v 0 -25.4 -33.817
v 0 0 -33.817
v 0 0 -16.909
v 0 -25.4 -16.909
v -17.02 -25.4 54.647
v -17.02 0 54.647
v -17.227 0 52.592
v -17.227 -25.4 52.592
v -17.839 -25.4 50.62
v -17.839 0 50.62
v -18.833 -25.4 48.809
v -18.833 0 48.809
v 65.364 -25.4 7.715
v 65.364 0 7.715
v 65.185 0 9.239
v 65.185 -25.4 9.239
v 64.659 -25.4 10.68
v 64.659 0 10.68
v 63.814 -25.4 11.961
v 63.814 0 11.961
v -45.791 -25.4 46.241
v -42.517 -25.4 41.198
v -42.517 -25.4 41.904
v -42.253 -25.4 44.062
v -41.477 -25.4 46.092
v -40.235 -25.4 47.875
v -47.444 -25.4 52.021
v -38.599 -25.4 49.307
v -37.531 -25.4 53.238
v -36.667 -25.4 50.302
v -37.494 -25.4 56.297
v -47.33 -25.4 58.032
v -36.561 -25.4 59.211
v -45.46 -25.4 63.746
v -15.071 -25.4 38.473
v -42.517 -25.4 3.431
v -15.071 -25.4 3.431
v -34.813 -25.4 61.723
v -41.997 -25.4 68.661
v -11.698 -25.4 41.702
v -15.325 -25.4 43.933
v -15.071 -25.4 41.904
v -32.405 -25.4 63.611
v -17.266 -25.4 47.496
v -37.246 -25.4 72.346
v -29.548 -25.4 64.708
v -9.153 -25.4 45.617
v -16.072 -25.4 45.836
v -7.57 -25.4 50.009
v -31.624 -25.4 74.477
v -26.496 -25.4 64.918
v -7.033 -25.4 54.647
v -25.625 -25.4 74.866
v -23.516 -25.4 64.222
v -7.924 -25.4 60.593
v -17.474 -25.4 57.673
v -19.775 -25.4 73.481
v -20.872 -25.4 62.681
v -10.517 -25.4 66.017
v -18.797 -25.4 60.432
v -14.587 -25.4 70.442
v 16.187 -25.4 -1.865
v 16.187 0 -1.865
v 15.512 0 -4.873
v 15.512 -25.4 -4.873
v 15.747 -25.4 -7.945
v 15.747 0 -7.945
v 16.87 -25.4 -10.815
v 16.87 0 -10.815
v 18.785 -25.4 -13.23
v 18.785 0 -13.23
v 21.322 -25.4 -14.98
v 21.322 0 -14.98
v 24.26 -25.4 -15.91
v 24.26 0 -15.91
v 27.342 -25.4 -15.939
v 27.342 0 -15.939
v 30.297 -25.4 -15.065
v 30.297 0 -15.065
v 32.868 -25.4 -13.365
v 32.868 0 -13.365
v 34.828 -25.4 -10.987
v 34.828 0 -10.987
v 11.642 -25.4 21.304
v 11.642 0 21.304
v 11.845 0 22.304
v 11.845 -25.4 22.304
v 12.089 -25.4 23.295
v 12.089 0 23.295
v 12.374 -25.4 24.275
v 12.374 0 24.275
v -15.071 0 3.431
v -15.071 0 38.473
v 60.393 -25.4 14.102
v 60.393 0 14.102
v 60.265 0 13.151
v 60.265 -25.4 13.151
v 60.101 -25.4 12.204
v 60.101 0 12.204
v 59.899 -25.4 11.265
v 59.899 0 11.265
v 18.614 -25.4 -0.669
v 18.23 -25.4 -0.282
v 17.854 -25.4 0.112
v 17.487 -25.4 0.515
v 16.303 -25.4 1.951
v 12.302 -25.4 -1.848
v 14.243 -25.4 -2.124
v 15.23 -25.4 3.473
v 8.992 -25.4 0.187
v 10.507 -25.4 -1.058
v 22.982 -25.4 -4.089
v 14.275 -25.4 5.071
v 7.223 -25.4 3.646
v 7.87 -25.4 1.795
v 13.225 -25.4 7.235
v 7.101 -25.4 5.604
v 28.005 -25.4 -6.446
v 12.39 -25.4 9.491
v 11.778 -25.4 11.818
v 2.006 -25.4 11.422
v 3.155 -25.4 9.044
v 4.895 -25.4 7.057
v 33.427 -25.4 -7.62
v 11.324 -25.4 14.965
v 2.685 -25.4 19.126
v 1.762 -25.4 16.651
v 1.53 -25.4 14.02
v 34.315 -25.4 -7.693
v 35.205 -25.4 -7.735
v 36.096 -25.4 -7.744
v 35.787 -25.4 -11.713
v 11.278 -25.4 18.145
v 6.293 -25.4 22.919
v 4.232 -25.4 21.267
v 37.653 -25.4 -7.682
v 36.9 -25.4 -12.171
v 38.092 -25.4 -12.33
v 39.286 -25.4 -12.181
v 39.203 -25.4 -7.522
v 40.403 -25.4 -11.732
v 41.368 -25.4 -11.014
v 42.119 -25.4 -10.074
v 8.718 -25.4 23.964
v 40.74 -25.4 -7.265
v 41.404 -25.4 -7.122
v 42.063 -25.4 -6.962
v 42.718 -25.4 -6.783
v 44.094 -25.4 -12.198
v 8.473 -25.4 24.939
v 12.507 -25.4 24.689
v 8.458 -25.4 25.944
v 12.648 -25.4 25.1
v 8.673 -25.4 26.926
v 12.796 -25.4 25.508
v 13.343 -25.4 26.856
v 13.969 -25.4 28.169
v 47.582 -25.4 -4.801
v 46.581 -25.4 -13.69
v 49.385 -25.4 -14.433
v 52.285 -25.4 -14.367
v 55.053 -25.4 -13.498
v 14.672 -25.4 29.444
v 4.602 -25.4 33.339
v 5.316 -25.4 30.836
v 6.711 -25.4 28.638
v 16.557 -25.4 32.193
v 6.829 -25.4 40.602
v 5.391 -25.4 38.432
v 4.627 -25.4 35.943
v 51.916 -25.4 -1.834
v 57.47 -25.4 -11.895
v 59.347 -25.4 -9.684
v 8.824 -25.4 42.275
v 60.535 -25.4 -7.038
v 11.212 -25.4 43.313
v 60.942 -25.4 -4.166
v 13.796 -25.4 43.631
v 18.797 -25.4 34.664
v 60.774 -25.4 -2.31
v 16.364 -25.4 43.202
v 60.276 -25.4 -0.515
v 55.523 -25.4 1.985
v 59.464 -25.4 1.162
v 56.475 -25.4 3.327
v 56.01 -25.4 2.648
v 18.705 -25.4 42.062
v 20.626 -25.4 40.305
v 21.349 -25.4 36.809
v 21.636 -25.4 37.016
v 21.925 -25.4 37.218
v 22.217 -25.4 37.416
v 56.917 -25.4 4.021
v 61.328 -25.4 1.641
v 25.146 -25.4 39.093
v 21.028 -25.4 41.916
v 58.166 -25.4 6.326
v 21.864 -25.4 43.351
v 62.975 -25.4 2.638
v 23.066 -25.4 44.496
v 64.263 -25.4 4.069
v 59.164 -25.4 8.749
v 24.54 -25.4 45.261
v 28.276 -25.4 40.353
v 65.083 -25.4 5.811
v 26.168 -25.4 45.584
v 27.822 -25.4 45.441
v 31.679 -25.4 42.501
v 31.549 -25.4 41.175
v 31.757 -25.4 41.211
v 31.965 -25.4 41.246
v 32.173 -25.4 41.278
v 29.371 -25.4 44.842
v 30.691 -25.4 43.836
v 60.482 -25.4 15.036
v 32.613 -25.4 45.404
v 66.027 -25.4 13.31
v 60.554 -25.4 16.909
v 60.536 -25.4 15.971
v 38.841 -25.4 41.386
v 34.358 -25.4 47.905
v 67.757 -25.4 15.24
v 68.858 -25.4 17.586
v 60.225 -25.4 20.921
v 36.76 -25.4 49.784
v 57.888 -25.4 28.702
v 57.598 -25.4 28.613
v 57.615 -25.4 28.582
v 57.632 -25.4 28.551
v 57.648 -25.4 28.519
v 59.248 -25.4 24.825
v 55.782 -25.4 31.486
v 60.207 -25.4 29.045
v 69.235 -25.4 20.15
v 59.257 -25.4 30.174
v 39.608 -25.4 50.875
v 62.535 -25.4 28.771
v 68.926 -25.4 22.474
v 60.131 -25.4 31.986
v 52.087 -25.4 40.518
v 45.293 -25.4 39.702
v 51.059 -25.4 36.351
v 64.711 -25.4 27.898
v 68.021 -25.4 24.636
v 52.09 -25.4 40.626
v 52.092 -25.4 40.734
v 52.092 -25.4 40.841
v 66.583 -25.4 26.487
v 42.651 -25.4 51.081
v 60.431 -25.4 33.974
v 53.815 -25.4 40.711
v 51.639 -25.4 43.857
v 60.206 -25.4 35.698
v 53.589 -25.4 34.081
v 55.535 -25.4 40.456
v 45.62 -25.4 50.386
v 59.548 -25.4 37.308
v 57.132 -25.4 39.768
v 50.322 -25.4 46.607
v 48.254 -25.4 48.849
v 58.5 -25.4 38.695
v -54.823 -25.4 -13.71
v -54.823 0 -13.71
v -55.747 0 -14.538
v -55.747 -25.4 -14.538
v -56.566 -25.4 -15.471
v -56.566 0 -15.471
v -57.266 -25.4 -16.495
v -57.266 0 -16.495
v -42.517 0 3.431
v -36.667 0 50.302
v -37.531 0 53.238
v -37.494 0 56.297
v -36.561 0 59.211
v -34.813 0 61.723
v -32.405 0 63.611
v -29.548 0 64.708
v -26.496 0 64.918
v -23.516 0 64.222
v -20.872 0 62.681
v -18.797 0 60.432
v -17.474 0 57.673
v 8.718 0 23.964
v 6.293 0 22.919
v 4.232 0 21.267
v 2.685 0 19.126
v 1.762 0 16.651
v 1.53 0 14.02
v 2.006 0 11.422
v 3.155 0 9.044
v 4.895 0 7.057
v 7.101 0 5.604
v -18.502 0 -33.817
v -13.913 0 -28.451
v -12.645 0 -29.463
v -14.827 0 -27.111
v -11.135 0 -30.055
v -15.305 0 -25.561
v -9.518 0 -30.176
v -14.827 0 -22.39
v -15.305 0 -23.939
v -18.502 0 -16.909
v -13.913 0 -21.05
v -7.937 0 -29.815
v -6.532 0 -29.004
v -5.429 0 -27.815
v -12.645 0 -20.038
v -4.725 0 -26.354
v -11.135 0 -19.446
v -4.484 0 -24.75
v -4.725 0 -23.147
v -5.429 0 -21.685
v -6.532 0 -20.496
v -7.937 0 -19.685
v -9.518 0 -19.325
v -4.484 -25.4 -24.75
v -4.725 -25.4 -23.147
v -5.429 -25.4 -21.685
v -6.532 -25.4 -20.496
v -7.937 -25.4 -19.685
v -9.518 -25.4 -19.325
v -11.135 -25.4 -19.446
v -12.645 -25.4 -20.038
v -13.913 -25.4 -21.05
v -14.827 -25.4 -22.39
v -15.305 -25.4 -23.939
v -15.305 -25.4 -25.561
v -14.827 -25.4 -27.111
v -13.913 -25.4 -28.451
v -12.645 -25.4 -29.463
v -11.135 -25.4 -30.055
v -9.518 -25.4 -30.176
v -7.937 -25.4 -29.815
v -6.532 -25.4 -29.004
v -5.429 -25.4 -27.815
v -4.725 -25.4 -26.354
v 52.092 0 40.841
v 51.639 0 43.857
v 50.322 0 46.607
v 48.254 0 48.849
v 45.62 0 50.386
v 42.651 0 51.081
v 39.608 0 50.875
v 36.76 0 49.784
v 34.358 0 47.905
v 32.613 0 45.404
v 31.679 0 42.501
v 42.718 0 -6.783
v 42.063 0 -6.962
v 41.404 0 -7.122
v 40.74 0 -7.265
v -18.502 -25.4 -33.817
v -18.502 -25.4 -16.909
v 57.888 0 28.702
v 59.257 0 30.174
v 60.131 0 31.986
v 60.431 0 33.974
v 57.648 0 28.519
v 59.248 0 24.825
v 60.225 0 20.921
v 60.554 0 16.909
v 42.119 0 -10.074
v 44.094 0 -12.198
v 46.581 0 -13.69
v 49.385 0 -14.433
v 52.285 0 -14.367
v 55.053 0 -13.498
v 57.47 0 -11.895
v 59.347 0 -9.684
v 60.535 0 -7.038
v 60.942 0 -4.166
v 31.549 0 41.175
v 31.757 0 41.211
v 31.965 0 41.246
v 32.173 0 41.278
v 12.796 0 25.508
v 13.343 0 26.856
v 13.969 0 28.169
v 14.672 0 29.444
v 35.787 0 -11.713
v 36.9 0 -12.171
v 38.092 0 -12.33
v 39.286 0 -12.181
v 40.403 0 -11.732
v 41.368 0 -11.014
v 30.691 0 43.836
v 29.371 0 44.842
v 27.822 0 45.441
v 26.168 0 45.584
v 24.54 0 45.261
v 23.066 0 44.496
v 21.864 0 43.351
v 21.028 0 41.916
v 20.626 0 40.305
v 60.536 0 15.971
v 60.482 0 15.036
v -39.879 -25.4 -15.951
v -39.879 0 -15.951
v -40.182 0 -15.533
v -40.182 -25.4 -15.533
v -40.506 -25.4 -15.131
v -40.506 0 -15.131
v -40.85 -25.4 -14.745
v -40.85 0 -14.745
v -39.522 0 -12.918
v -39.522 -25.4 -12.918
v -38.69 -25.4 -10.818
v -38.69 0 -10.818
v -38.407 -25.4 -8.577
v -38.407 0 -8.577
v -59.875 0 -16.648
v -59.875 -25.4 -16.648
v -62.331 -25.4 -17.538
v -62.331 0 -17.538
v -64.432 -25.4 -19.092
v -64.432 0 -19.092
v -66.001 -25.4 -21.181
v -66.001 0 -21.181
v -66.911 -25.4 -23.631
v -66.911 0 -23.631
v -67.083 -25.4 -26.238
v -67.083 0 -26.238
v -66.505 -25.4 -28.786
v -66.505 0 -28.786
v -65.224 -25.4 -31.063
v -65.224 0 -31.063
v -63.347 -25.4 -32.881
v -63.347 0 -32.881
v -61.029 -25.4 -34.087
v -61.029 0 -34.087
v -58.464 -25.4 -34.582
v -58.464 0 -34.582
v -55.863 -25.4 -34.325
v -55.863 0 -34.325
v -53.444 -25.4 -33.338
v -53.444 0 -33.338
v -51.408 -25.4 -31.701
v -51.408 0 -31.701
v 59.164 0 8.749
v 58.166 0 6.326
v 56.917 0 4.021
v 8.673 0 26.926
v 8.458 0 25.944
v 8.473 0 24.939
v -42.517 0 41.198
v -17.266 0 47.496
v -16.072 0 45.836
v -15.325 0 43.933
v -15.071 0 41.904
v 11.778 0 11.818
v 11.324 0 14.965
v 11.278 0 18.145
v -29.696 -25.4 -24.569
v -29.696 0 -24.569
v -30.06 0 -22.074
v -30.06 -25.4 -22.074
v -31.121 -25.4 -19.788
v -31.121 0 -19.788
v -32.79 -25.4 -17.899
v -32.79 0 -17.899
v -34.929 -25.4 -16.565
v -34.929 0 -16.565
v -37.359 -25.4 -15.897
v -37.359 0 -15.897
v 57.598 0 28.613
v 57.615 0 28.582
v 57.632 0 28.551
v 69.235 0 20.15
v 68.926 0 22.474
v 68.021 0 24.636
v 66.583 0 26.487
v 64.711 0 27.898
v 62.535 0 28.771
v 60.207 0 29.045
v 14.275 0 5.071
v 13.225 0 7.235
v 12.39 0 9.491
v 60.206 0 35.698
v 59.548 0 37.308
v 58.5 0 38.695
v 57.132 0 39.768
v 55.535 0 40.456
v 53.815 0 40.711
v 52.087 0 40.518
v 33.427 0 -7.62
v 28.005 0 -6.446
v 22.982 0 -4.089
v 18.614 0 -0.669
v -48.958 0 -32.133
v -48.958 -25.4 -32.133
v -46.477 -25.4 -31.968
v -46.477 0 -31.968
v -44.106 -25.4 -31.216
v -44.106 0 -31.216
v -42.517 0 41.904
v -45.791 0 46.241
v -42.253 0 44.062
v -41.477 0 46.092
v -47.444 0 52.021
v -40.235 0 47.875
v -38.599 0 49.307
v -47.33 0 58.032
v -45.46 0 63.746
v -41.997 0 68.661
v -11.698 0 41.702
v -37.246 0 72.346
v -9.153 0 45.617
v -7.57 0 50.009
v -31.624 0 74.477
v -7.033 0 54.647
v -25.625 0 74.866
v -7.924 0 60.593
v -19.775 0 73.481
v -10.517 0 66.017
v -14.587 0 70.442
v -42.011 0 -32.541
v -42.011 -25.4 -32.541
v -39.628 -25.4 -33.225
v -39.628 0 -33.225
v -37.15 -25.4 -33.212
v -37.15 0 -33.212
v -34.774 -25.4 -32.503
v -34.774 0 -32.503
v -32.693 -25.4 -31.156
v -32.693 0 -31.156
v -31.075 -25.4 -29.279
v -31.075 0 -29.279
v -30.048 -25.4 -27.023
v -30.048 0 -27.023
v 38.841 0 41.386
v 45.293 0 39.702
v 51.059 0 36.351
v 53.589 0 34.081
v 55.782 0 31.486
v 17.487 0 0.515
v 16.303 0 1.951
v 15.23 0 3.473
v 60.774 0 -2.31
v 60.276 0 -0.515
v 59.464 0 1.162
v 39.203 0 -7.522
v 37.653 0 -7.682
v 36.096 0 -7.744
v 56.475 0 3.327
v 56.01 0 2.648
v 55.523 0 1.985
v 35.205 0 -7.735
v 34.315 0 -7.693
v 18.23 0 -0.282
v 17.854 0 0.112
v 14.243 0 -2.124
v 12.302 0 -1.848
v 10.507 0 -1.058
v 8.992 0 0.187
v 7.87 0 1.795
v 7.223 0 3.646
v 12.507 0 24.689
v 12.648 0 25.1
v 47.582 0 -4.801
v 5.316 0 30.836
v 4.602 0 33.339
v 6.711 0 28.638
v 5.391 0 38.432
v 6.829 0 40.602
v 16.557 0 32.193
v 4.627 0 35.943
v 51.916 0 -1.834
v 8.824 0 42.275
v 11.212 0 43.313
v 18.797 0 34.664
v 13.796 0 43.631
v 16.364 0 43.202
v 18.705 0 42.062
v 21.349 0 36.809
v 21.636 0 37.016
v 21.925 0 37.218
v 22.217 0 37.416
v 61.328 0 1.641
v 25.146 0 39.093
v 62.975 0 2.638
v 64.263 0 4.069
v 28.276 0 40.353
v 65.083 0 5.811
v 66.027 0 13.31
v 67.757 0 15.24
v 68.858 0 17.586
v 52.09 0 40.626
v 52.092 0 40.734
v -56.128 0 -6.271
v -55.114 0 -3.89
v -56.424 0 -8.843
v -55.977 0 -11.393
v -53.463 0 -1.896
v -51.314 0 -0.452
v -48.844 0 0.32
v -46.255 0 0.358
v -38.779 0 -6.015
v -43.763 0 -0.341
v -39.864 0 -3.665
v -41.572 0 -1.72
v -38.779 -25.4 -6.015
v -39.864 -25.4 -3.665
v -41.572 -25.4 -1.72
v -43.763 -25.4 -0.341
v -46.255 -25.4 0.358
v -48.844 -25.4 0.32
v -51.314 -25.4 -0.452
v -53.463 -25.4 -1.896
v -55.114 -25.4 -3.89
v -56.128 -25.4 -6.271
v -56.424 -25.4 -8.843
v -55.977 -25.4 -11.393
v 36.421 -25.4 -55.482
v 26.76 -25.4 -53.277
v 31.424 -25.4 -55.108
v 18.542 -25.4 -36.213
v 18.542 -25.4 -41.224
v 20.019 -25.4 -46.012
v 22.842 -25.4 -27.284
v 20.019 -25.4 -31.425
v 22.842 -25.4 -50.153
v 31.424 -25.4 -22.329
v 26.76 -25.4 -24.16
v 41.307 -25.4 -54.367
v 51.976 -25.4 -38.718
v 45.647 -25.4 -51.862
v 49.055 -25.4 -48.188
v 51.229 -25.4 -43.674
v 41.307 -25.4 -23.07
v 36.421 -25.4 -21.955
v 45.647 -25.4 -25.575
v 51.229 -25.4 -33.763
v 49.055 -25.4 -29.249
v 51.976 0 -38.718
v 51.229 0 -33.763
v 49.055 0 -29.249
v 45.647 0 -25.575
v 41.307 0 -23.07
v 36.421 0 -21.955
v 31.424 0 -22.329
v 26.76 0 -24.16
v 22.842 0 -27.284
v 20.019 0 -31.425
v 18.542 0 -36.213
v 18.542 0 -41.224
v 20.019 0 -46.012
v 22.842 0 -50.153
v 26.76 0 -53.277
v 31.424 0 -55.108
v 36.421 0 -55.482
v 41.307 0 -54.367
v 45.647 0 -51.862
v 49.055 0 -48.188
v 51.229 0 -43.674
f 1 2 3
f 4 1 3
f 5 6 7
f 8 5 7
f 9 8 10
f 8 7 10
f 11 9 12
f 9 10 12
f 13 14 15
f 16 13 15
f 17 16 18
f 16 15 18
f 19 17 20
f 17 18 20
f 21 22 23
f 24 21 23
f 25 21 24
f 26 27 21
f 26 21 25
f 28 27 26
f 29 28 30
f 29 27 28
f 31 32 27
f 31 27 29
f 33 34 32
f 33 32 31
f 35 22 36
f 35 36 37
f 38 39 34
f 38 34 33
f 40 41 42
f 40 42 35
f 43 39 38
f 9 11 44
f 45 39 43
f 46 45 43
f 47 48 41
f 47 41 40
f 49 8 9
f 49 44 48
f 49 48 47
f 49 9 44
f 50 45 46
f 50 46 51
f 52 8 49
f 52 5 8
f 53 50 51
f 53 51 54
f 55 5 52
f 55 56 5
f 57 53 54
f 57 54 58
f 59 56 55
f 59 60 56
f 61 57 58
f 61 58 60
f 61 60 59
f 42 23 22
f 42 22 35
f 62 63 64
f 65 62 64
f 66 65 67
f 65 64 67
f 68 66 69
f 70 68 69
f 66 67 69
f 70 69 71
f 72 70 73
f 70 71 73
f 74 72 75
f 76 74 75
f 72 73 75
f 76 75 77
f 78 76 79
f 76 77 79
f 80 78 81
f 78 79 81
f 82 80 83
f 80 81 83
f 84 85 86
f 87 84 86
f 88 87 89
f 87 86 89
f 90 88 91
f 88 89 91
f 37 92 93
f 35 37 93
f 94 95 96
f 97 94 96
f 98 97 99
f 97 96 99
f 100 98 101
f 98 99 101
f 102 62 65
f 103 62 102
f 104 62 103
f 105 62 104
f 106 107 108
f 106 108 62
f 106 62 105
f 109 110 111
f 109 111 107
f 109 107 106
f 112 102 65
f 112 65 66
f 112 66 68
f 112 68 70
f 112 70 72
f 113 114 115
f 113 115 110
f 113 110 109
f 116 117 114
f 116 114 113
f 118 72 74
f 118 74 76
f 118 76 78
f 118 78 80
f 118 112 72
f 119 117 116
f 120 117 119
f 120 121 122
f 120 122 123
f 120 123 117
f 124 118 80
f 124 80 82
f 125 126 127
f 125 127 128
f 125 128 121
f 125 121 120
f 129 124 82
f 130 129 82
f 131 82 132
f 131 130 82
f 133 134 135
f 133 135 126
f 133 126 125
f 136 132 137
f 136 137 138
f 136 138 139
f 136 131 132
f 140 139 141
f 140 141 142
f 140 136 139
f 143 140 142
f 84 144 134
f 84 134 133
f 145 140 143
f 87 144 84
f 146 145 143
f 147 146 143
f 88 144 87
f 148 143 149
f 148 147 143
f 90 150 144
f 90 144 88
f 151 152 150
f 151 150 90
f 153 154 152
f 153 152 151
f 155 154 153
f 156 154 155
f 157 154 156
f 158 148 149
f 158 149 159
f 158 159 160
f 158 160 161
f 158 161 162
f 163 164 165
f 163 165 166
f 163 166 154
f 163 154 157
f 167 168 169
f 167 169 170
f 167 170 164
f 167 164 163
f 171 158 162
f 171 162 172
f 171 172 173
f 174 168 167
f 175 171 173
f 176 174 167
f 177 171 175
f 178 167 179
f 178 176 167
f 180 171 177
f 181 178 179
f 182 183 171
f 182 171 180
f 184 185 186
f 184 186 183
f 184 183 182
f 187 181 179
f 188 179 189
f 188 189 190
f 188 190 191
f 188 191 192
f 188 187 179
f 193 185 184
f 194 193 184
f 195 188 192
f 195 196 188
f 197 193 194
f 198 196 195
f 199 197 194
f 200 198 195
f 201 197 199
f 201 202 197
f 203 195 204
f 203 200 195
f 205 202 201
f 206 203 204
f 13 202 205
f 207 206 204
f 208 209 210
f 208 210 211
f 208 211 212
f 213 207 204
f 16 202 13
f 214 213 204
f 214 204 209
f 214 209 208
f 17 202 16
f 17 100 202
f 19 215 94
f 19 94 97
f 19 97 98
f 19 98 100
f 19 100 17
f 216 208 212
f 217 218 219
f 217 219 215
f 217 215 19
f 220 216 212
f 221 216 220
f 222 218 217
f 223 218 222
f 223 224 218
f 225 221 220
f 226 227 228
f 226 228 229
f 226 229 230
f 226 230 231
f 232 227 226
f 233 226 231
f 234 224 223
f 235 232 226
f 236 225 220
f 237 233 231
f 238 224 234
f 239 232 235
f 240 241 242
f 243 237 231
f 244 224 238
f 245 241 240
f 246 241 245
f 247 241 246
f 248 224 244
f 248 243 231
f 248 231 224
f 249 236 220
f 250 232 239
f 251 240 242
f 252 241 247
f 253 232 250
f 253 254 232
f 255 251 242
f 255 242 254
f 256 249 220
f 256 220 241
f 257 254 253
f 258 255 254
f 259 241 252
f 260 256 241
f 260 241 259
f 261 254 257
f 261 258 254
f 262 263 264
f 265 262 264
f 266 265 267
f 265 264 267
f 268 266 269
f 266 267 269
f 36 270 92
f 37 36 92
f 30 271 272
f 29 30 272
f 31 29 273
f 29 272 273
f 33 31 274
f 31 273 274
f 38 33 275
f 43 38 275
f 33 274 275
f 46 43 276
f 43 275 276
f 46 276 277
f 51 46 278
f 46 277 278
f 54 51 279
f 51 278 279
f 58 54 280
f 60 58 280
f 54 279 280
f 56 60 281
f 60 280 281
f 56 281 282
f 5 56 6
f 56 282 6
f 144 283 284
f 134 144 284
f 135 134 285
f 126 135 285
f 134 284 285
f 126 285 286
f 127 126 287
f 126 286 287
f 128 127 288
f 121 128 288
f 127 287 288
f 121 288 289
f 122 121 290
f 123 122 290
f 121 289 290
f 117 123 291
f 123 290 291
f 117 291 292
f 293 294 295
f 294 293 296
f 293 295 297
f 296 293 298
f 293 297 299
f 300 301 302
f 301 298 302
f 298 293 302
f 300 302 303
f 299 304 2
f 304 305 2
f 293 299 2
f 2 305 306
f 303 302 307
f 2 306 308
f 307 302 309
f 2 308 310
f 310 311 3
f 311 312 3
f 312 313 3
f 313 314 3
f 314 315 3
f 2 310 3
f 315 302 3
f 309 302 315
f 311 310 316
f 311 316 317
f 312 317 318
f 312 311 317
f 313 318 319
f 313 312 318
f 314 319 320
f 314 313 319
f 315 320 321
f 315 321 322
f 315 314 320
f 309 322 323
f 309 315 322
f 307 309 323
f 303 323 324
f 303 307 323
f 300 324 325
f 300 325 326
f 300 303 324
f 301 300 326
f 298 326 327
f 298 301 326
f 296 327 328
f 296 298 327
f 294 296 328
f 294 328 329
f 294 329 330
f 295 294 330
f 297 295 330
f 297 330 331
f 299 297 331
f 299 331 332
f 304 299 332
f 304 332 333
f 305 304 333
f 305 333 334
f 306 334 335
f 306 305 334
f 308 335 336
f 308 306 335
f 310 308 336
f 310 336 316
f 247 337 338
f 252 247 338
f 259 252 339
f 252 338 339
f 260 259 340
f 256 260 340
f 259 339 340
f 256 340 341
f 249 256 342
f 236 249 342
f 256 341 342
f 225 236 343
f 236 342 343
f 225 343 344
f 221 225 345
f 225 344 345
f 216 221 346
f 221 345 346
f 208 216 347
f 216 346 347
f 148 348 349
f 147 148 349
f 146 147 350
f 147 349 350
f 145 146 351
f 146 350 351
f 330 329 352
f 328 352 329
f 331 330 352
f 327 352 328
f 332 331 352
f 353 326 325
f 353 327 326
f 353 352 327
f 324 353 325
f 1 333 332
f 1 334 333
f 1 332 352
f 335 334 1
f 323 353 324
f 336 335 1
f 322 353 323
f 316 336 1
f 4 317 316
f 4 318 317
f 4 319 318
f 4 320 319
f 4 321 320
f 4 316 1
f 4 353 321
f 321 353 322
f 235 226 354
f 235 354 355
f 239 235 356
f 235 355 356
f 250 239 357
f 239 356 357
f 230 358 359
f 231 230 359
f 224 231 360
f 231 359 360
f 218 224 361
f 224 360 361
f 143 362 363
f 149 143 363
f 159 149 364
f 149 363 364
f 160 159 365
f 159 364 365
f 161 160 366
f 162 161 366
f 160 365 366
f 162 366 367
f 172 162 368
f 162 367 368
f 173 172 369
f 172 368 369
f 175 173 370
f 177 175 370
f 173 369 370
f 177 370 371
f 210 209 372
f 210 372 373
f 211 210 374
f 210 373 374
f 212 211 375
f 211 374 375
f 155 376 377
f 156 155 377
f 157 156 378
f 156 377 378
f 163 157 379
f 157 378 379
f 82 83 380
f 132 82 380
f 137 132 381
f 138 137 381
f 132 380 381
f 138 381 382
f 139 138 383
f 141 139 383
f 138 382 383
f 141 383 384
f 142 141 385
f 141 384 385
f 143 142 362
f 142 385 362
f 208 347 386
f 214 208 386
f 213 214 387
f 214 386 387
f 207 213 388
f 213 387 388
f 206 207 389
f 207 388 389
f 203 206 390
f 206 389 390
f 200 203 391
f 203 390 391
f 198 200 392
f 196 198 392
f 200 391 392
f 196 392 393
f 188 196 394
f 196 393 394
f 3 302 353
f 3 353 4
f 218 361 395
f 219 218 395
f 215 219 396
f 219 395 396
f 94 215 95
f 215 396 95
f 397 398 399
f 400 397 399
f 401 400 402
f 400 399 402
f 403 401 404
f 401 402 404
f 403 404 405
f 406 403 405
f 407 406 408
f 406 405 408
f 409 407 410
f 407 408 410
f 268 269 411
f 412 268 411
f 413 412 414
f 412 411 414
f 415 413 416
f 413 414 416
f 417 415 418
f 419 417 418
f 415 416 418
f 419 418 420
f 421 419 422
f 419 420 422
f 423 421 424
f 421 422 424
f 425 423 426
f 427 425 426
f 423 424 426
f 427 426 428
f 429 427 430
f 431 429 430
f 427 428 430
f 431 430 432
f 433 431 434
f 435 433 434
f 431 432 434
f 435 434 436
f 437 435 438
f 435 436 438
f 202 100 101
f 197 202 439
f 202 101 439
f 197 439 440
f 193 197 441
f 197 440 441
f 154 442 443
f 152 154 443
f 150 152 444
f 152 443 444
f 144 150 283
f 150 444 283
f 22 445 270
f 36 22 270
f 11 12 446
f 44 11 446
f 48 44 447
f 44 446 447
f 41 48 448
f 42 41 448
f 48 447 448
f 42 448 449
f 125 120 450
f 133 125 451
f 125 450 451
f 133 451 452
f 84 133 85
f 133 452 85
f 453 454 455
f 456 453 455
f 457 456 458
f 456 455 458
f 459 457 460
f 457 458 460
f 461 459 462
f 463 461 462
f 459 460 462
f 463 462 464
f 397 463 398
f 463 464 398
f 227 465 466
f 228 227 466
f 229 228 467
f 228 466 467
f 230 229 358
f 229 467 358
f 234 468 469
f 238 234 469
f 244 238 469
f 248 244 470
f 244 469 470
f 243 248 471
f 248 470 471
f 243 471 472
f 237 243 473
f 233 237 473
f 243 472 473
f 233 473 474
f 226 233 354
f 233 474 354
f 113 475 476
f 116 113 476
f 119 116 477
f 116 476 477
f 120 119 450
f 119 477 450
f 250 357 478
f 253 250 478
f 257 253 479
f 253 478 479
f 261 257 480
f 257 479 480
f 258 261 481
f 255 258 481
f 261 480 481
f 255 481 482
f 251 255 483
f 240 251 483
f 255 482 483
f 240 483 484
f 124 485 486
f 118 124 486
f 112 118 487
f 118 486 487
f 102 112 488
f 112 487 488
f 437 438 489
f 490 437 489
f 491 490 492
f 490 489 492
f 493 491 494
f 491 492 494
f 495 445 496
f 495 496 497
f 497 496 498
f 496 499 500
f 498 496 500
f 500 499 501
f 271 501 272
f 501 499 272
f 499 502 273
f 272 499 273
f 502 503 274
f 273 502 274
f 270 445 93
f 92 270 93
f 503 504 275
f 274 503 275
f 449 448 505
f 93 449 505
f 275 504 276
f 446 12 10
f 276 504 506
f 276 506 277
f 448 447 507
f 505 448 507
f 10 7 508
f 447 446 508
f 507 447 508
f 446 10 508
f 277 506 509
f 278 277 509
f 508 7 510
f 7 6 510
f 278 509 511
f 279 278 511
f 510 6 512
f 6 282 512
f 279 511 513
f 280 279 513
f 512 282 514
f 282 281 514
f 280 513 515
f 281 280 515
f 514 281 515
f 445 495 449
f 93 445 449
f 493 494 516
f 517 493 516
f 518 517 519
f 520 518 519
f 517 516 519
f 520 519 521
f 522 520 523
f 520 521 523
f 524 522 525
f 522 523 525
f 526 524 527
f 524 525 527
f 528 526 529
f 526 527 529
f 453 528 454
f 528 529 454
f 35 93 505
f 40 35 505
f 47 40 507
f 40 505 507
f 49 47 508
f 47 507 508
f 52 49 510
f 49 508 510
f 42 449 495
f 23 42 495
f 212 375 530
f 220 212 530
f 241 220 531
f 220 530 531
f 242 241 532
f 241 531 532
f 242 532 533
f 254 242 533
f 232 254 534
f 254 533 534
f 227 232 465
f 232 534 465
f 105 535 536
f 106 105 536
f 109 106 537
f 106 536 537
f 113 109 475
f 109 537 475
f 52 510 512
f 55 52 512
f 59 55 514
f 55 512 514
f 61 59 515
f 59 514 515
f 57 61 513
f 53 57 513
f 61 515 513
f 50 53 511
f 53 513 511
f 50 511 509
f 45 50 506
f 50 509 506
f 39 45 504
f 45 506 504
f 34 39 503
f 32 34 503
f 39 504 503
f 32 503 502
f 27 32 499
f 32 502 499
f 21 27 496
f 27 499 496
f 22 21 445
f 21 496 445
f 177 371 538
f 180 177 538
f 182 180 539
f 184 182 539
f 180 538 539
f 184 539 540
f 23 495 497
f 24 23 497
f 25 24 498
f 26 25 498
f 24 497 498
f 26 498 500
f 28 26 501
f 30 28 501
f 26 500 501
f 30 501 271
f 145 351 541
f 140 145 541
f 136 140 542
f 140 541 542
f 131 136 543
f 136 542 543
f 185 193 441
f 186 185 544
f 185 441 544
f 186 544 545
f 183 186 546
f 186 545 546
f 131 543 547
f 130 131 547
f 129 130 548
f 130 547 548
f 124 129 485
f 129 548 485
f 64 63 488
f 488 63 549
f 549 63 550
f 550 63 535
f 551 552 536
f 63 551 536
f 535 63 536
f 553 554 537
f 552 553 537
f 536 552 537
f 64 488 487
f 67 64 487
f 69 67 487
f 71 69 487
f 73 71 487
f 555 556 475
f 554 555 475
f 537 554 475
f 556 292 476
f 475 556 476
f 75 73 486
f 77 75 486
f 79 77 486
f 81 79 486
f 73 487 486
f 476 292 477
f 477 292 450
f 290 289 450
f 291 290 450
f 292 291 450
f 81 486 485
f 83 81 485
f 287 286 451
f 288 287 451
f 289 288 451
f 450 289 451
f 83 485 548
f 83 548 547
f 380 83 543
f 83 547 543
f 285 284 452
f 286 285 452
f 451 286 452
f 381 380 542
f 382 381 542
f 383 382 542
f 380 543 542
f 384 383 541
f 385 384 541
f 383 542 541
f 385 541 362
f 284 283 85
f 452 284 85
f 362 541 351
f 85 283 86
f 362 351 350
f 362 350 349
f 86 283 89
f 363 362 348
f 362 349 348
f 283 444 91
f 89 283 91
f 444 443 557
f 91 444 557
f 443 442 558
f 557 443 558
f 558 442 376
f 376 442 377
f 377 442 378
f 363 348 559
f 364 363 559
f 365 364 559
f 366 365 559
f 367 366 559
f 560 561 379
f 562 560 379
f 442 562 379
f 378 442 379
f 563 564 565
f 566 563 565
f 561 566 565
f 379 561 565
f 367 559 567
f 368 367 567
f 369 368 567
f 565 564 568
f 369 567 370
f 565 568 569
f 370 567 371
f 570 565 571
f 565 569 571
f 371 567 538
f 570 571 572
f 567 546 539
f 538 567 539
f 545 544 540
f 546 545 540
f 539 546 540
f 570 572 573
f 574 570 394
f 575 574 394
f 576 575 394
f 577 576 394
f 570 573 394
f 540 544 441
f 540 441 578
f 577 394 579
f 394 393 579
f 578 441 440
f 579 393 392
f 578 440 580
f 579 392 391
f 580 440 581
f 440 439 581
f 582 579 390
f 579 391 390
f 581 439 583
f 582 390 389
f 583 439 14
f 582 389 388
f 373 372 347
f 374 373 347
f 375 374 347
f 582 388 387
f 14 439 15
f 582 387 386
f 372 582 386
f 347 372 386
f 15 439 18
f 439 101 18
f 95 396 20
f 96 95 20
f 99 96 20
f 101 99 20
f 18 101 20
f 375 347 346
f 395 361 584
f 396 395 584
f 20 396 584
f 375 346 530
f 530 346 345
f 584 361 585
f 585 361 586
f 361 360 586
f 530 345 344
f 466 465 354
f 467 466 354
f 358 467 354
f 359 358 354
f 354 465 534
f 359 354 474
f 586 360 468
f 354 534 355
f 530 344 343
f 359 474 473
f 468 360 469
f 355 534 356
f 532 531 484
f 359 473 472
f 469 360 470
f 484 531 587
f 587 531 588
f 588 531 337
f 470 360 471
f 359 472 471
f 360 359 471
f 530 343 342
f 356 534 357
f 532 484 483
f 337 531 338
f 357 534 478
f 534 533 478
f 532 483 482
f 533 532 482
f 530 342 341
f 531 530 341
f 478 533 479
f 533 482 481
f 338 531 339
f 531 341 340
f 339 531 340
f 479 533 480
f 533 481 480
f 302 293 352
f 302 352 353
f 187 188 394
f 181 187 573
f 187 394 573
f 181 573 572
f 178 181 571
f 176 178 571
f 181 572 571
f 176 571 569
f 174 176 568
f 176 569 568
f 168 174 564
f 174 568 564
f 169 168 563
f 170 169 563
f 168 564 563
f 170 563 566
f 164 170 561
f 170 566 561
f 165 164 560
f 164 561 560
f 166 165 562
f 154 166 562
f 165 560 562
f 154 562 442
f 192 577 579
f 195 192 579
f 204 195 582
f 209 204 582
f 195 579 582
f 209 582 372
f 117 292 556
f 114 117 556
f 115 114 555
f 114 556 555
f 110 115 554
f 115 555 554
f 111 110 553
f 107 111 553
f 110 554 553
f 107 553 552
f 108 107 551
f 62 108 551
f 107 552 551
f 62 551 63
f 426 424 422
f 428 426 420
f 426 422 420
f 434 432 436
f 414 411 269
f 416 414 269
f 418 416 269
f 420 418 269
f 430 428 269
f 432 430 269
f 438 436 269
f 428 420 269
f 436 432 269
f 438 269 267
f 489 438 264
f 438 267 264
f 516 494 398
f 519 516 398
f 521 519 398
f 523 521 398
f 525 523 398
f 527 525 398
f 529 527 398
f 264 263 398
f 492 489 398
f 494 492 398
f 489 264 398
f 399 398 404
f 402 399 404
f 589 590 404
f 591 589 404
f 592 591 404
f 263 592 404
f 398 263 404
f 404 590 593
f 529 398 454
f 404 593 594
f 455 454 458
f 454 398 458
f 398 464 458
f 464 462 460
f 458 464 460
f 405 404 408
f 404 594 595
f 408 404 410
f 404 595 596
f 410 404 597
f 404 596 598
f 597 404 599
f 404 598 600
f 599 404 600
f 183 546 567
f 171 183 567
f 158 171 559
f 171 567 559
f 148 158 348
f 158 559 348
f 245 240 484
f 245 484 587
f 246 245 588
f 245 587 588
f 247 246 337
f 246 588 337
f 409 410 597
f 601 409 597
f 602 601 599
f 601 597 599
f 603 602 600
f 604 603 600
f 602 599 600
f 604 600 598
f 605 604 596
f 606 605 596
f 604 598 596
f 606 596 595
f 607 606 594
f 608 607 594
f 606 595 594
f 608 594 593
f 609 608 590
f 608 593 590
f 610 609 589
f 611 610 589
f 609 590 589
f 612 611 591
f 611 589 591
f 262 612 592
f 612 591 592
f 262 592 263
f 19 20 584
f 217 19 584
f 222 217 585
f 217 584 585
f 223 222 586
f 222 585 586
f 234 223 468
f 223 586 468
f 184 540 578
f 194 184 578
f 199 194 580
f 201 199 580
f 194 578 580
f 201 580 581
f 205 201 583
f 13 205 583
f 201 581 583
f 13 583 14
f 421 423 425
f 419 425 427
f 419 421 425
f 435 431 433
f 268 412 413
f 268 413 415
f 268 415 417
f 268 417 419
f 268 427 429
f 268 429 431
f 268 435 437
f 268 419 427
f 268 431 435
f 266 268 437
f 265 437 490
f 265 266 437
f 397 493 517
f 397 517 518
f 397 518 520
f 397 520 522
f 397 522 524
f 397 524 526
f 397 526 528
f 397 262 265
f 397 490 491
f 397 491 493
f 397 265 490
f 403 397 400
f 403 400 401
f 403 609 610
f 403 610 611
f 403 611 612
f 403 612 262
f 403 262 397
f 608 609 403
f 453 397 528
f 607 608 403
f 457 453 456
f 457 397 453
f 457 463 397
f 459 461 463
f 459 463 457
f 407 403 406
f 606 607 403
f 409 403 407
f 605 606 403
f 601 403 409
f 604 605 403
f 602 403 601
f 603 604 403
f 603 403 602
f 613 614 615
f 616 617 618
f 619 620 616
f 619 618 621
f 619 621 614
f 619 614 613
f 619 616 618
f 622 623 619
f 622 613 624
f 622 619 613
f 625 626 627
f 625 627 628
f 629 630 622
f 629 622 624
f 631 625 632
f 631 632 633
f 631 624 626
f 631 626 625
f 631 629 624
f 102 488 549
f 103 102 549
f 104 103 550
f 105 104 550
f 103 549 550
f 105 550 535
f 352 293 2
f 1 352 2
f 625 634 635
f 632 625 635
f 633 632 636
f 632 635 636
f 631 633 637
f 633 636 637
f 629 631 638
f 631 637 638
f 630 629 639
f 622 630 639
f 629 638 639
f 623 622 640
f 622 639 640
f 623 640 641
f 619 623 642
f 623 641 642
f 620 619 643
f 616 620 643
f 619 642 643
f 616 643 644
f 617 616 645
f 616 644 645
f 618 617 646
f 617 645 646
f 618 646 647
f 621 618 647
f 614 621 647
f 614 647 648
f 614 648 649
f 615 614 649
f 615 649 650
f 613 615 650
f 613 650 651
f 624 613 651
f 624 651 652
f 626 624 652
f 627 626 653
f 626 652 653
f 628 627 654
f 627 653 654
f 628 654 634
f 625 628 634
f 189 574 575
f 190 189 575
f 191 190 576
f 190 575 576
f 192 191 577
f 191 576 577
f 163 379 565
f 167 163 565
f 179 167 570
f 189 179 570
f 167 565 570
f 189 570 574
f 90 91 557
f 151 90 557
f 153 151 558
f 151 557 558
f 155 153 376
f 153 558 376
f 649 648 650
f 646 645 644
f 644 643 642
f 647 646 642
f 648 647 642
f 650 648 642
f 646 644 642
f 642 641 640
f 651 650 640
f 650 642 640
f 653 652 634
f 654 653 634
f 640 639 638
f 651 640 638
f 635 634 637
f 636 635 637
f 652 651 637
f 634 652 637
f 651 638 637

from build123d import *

# Parameters (mm, degrees)
F1_DEPTH = 25.4
F0_W     = 18.5015480965
F0_H     = 16.9086977839
F0_R     = 5.4410723948
F0_R_2   = 16.8107477908


with BuildPart() as f1:
    # F0 (on Front) → F1 (new body)
    with BuildSketch(Plane.XZ):
        with BuildLine():
            ThreePointArc((-44.105960391, -31.2155596656), (-39.701340636, -27.4006422459), (-38.0592641048, -21.8097697943))
            ThreePointArc((-38.0592641048, -21.8097697943), (-38.5247490039, -18.7424495054), (-39.8792886329, -15.9513292394))
            ThreePointArc((-39.8792886329, -15.9513292394), (-46.8550976629, -22.2370236132), (-44.105960391, -31.2155596656))
        make_face()
        with BuildLine():
            ThreePointArc((-39.8792886329, -15.9513292394), (-38.5247490039, -18.7424495054), (-38.0592641048, -21.8097697943))
            ThreePointArc((-38.0592641048, -21.8097697943), (-39.701340636, -27.4006422459), (-44.105960391, -31.2155596656))
            ThreePointArc((-44.105960391, -31.2155596656), (-34.7742718917, -32.5031076851), (-29.6964222745, -24.5687751098))
            ThreePointArc((-29.6964222745, -24.5687751098), (-32.7896501946, -17.8988586822), (-39.8792886329, -15.9513292394))
        make_face()
        with BuildLine():
            ThreePointArc((-44.105960391, -31.2155596656), (-46.8550976629, -22.2370236132), (-39.8792886329, -15.9513292394))
            ThreePointArc((-39.8792886329, -15.9513292394), (-40.3417982851, -15.3299965274), (-40.8495270544, -14.7450341232))
            ThreePointArc((-40.8495270544, -14.7450341232), (-48.083492635, -17.5627692138), (-54.8233426971, -13.709937761))
            ThreePointArc((-54.8233426971, -13.709937761), (-56.1705113302, -14.9921012619), (-57.2661782927, -16.4948721947))
            ThreePointArc((-57.2661782927, -16.4948721947), (-51.3655623816, -19.3982706429), (-48.9802804829, -25.5266816069))
            ThreePointArc((-48.9802804829, -25.5266816069), (-49.6089599176, -28.8437891732), (-51.4078010658, -31.7008175177))
            ThreePointArc((-51.4078010658, -31.7008175177), (-47.7125109929, -32.1258351585), (-44.105960391, -31.2155596656))
        make_face()
        with BuildLine():
            ThreePointArc((-54.8233426971, -13.709937761), (-48.083492635, -17.5627692138), (-40.8495270544, -14.7450341232))
            ThreePointArc((-40.8495270544, -14.7450341232), (-47.6343396192, -11.4991970983), (-54.8233426971, -13.709937761))
        make_face()
        with BuildLine():
            ThreePointArc((-54.8233426971, -13.709937761), (-47.6343396192, -11.4991970983), (-40.8495270544, -14.7450341232))
            ThreePointArc((-40.8495270544, -14.7450341232), (-39.0401194284, -11.8938912699), (-38.4073600457, -8.5768764839))
            ThreePointArc((-38.4073600457, -8.5768764839), (-50.1069455323, 0.0230189296), (-54.8233426971, -13.709937761))
        make_face()
        with BuildLine():
            ThreePointArc((-57.2661782927, -16.4948721947), (-66.5049464666, -28.7857797019), (-51.4078010658, -31.7008175177))
            ThreePointArc((-51.4078010658, -31.7008175177), (-58.0456640551, -25.5266816069), (-57.2661782927, -16.4948721947))
        make_face()
        with BuildLine():
            ThreePointArc((-57.2661782927, -16.4948721947), (-58.0456640551, -25.5266816069), (-51.4078010658, -31.7008175177))
            ThreePointArc((-51.4078010658, -31.7008175177), (-49.6089599176, -28.8437891732), (-48.9802804829, -25.5266816069))
            ThreePointArc((-48.9802804829, -25.5266816069), (-51.3655623816, -19.3982706429), (-57.2661782927, -16.4948721947))
        make_face()
    extrude(amount=F1_DEPTH)


with BuildPart() as f1b:
    # F0 (on Front) → F1, piece 2 (new body)
    with BuildSketch(Plane.XZ):
        with BuildLine():
            Line((-15.0707969442, 41.9041663408), (-42.5168015063, 41.9041663408))
            Line((-42.5168015063, 41.9041663408), (-42.5168015063, 41.1980028544))
            ThreePointArc((-42.5168015063, 41.1980028544), (-29.3278937528, 34.4555273158), (-15.0707969442, 38.4734191396))
            Line((-15.0707969442, 38.4734191396), (-15.0707969442, 41.9041663408))
        make_face()
        with BuildLine():
            Line((-42.5168015063, 41.1980028544), (-42.5168015063, 41.9041663408))
            ThreePointArc((-42.5168015063, 41.9041663408), (-40.910051081, 47.0215506819), (-36.6665349653, 50.3020750911))
            ThreePointArc((-36.6665349653, 50.3020750911), (-29.5484051816, 64.7077888644), (-17.0195600007, 54.6469539404))
            ThreePointArc((-17.0195600007, 54.6469539404), (-17.4832585843, 51.5906805508), (-18.8326194536, 48.809485007))
            ThreePointArc((-18.8326194536, 48.809485007), (-16.0722684703, 45.8359195908), (-15.0707969442, 41.9041663408))
            Line((-15.0707969442, 41.9041663408), (-15.0707969442, 38.4734191396))
            ThreePointArc((-15.0707969442, 38.4734191396), (-9.1530818862, 45.6165531595), (-7.0328043403, 54.6469539404))
            ThreePointArc((-7.0328043403, 54.6469539404), (-34.5147432513, 73.6205430855), (-42.5168015063, 41.1980028544))
        make_face()
        with BuildLine():
            ThreePointArc((-15.0707969442, 38.4734191396), (-29.3278937528, 34.4555273158), (-42.5168015063, 41.1980028544))
            Line((-42.5168015063, 41.1980028544), (-42.5168015063, 3.4307504538))
            Line((-42.5168015063, 3.4307504538), (-15.0707969442, 3.4307504538))
            Line((-15.0707969442, 3.4307504538), (-15.0707969442, 38.4734191396))
        make_face()
    extrude(amount=F1_DEPTH)


with BuildPart() as f1c:
    # F0 (on Front) → F1, piece 3 (new body)
    with BuildSketch(Plane.XZ):
        with BuildLine():
            ThreePointArc((57.6483064262, 28.5192779382), (59.8161967898, 22.8929664588), (60.55352841, 16.9086977839))
            ThreePointArc((60.55352841, 16.9086977839), (60.5134329623, 15.5032254597), (60.3932770401, 14.1023248017))
            ThreePointArc((60.3932770401, 14.1023248017), (62.2714862871, 13.2999587282), (63.8137559237, 11.9609793934))
            ThreePointArc((63.8137559237, 11.9609793934), (67.7570534198, 15.2396195477), (69.2352365393, 20.1502255256))
            ThreePointArc((69.2352365393, 20.1502255256), (65.6933667008, 27.2544700874), (57.8881716099, 28.7015576243))
            ThreePointArc((57.8881716099, 28.7015576243), (57.7692578437, 28.6090770898), (57.6483064262, 28.5192779382))
        make_face()
        with BuildLine():
            ThreePointArc((57.5980114218, 28.612999071), (57.6232094679, 28.5661656287), (57.6483064262, 28.5192779382))
            ThreePointArc((57.6483064262, 28.5192779382), (57.7692578437, 28.6090770898), (57.8881716099, 28.7015576243))
            ThreePointArc((57.8881716099, 28.7015576243), (57.7427139718, 28.6585153627), (57.5980114218, 28.612999071))
        make_face()
        with BuildLine():
            ThreePointArc((63.8137559237, 11.9609793934), (62.2714862871, 13.2999587282), (60.3932770401, 14.1023248017))
            ThreePointArc((60.3932770401, 14.1023248017), (60.1875660933, 12.6766371815), (59.898940815, 11.2653974313))
            ThreePointArc((59.898940815, 11.2653974313), (61.8957091687, 11.3916613164), (63.8137559237, 11.9609793934))
        make_face()
        with BuildLine():
            ThreePointArc((51.0589278362, 36.35083348), (54.7302229927, 32.8214297216), (57.5980114218, 28.612999071))
            ThreePointArc((57.5980114218, 28.612999071), (57.7427139718, 28.6585153627), (57.8881716099, 28.7015576243))
            ThreePointArc((57.8881716099, 28.7015576243), (59.7617981113, 31.0473321559), (60.4305932211, 33.9740790737))
            ThreePointArc((60.4305932211, 33.9740790737), (57.8509045854, 39.2760440121), (52.0870420266, 40.5184264284))
            ThreePointArc((52.0870420266, 40.5184264284), (51.7930659491, 38.3803376037), (51.0589278362, 36.35083348))
        make_face()
        with BuildLine():
            ThreePointArc((63.8137559237, 11.9609793934), (61.8957091687, 11.3916613164), (59.898940815, 11.2653974313))
            ThreePointArc((59.898940815, 11.2653974313), (58.6975117824, 7.5242103658), (56.9169477045, 4.0214251963))
            ThreePointArc((56.9169477045, 4.0214251963), (58.323864183, 2.7107346584), (59.4637388064, 1.1621838822))
            ThreePointArc((59.4637388064, 1.1621838822), (63.6716873797, 3.3061432275), (65.3641596788, 7.7151034662))
            ThreePointArc((65.3641596788, 7.7151034662), (64.9644339318, 9.9751484986), (63.8137559237, 11.9609793934))
        make_face()
        with BuildLine():
            ThreePointArc((48.4070297685, 38.1539810334), (49.7623287591, 37.2955723838), (51.0589278362, 36.35083348))
            ThreePointArc((51.0589278362, 36.35083348), (51.7930659491, 38.3803376037), (52.0870420266, 40.5184264284))
            ThreePointArc((52.0870420266, 40.5184264284), (50.0498402913, 39.6431180923), (48.4070297685, 38.1539810334))
        make_face()
        with BuildLine():
            ThreePointArc((59.4637388064, 1.1621838822), (58.323864183, 2.7107346584), (56.9169477045, 4.0214251963))
            ThreePointArc((56.9169477045, 4.0214251963), (56.2455052486, 2.9855578421), (55.5230523371, 1.9845993326))
            ThreePointArc((55.5230523371, 1.9845993326), (57.4290501922, 1.26507424), (59.4637388064, 1.1621838822))
        make_face()
        with BuildLine():
            ThreePointArc((32.1725417924, 41.2784003418), (40.5594966858, 41.1176090051), (48.4070297685, 38.1539810334))
            ThreePointArc((48.4070297685, 38.1539810334), (50.0498402913, 39.6431180923), (52.0870420266, 40.5184264284))
            ThreePointArc((52.0870420266, 40.5184264284), (52.0908434142, 40.6797488704), (52.0921106476, 40.841111118))
            ThreePointArc((52.0921106476, 40.841111118), (42.6507517291, 51.0814134273), (31.6788914945, 42.5011259843))
            ThreePointArc((31.6788914945, 42.5011259843), (31.9599990129, 41.9036039637), (32.1725417924, 41.2784003418))
        make_face()
        with BuildLine():
            ThreePointArc((59.4637388064, 1.1621838822), (57.4290501922, 1.26507424), (55.5230523371, 1.9845993326))
            ThreePointArc((55.5230523371, 1.9845993326), (49.8282207146, -3.4332177847), (42.7175500908, -6.7831749196))
            ThreePointArc((42.7175500908, -6.7831749196), (42.7774735859, -7.2122685718), (42.7975051785, -7.6450628912))
            ThreePointArc((42.7975051785, -7.6450628912), (42.6246726898, -8.9058994461), (42.1189259159, -10.0737179628))
            ThreePointArc((42.1189259159, -10.0737179628), (53.699537359, -14.0303033075), (60.9423887087, -4.1659111157))
            ThreePointArc((60.9423887087, -4.1659111157), (60.5658702226, -1.4011777723), (59.4637388064, 1.1621838822))
        make_face()
        with BuildLine():
            ThreePointArc((31.5493209593, 41.1748779039), (31.860599755, 41.2286355309), (32.1725417924, 41.2784003418))
            ThreePointArc((32.1725417924, 41.2784003418), (31.9599990129, 41.9036039637), (31.6788914945, 42.5011259843))
            ThreePointArc((31.6788914945, 42.5011259843), (31.5925816009, 41.8401048367), (31.5493209593, 41.1748779039))
        make_face()
        with BuildLine():
            ThreePointArc((22.2173461598, 37.416117792), (26.6895599589, 39.7765847769), (31.5493209593, 41.1748779039))
            ThreePointArc((31.5493209593, 41.1748779039), (31.5925816009, 41.8401048367), (31.6788914945, 42.5011259843))
            ThreePointArc((31.6788914945, 42.5011259843), (25.3424653448, 45.4800632646), (20.6259099925, 40.3052715511))
            ThreePointArc((20.6259099925, 40.3052715511), (21.5539168866, 38.9335634819), (22.2173461598, 37.416117792))
        make_face()
        with BuildLine():
            ThreePointArc((42.7975051785, -7.6450628912), (42.7774735859, -7.2122685718), (42.7175500908, -6.7831749196))
            ThreePointArc((42.7175500908, -6.7831749196), (41.7337848952, -7.0443829777), (40.740076, -7.2647604747))
            ThreePointArc((40.740076, -7.2647604747), (41.3226161462, -8.7217064114), (42.1189259159, -10.0737179628))
            ThreePointArc((42.1189259159, -10.0737179628), (42.6246726898, -8.9058994461), (42.7975051785, -7.6450628912))
        make_face()
        with BuildLine():
            ThreePointArc((42.1189259159, -10.0737179628), (41.3226161462, -8.7217064114), (40.740076, -7.2647604747))
            ThreePointArc((40.740076, -7.2647604747), (38.4295601819, -7.6143955676), (36.0963201413, -7.7436973717))
            ThreePointArc((36.0963201413, -7.7436973717), (35.5985832283, -9.4185975159), (34.8278391678, -10.9867129837))
            ThreePointArc((34.8278391678, -10.9867129837), (38.6942647568, -12.294158708), (42.1189259159, -10.0737179628))
        make_face()
        with BuildLine():
            ThreePointArc((21.3490231548, 36.8093949804), (21.7799255932, 37.1174206583), (22.2173461598, 37.416117792))
            ThreePointArc((22.2173461598, 37.416117792), (21.5539168866, 38.9335634819), (20.6259099925, 40.3052715511))
            ThreePointArc((20.6259099925, 40.3052715511), (20.7165868902, 38.5013024934), (21.3490231548, 36.8093949804))
        make_face()
        with BuildLine():
            ThreePointArc((14.6716683333, 29.4435243879), (17.6351847562, 33.4665529562), (21.3490231548, 36.8093949804))
            ThreePointArc((21.3490231548, 36.8093949804), (20.7165868902, 38.5013024934), (20.6259099925, 40.3052715511))
            ThreePointArc((20.6259099925, 40.3052715511), (6.8289843993, 40.6021333201), (8.6727883362, 26.9257423569))
            ThreePointArc((8.6727883362, 26.9257423569), (11.1083628612, 29.528102056), (14.6716683333, 29.4435243879))
        make_face()
        with BuildLine():
            ThreePointArc((34.8278391678, -10.9867129837), (35.5985832283, -9.4185975159), (36.0963201413, -7.7436973717))
            ThreePointArc((36.0963201413, -7.7436973717), (34.7598660992, -7.7180818666), (33.4267648963, -7.6200678704))
            ThreePointArc((33.4267648963, -7.6200678704), (33.7863412788, -9.4452857926), (34.8278391678, -10.9867129837))
        make_face()
        with BuildLine():
            ThreePointArc((34.8278391678, -10.9867129837), (33.7863412788, -9.4452857926), (33.4267648963, -7.6200678704))
            ThreePointArc((33.4267648963, -7.6200678704), (25.4268822891, -5.409128538), (18.6140751372, -0.6686609267))
            ThreePointArc((18.6140751372, -0.6686609267), (17.4573398254, -1.3821877286), (16.1870574514, -1.8654472539))
            ThreePointArc((16.1870574514, -1.8654472539), (21.3220410847, -14.9796366957), (34.8278391678, -10.9867129837))
        make_face()
        with BuildLine():
            ThreePointArc((12.7956011744, 25.5080796541), (13.646469544, 27.517354577), (14.6716683333, 29.4435243879))
            ThreePointArc((14.6716683333, 29.4435243879), (11.1083628612, 29.528102056), (8.6727883362, 26.9257423569))
            ThreePointArc((8.6727883362, 26.9257423569), (10.6478483221, 25.9658003692), (12.7956011744, 25.5080796541))
        make_face()
        with BuildLine():
            ThreePointArc((16.1870574514, -1.8654472539), (16.7593955852, -0.6325480597), (17.4874281549, 0.5153107905))
            ThreePointArc((17.4874281549, 0.5153107905), (15.752273434, 2.7018746533), (14.2754203195, 5.070572251))
            ThreePointArc((14.2754203195, 5.070572251), (10.6375695456, 4.6584160514), (7.1005627378, 5.6036217581))
            ThreePointArc((7.1005627378, 5.6036217581), (9.7068187444, -0.4873592656), (16.1870574514, -1.8654472539))
        make_face()
        with BuildLine():
            ThreePointArc((18.6140751372, -0.6686609267), (18.0409376757, -0.0860138723), (17.4874281549, 0.5153107905))
            ThreePointArc((17.4874281549, 0.5153107905), (16.7593955852, -0.6325480597), (16.1870574514, -1.8654472539))
            ThreePointArc((16.1870574514, -1.8654472539), (17.4573398254, -1.3821877286), (18.6140751372, -0.6686609267))
        make_face()
        with BuildLine():
            ThreePointArc((12.7956011744, 25.5080796541), (10.6478483221, 25.9658003692), (8.6727883362, 26.9257423569))
            ThreePointArc((8.6727883362, 26.9257423569), (8.4363768899, 25.440871957), (8.7184506356, 23.963995226))
            ThreePointArc((8.7184506356, 23.963995226), (10.5313643758, 24.2913611104), (12.3735283305, 24.2753418823))
            ThreePointArc((12.3735283305, 24.2753418823), (12.5764191083, 24.8944997273), (12.7956011744, 25.5080796541))
        make_face()
        with BuildLine():
            ThreePointArc((7.1005627378, 5.6036217581), (10.6375695456, 4.6584160514), (14.2754203195, 5.070572251))
            ThreePointArc((14.2754203195, 5.070572251), (12.779492277, 8.3527218109), (11.7784966135, 11.8180232587))
            ThreePointArc((11.7784966135, 11.8180232587), (8.5273306523, 9.3974866565), (7.1005627378, 5.6036217581))
        make_face()
        with BuildLine():
            ThreePointArc((11.6420996411, 21.3037024767), (9.861453998, 22.2834659432), (8.7184506356, 23.963995226))
            ThreePointArc((8.7184506356, 23.963995226), (1.5574294353, 15.3435437789), (7.1005627378, 5.6036217581))
            ThreePointArc((7.1005627378, 5.6036217581), (8.5273306523, 9.3974866565), (11.7784966135, 11.8180232587))
            ThreePointArc((11.7784966135, 11.8180232587), (11.2497286463, 16.554240223), (11.6420996411, 21.3037024767))
        make_face()
        with BuildLine():
            ThreePointArc((12.3735283305, 24.2753418823), (10.5313643758, 24.2913611104), (8.7184506356, 23.963995226))
            ThreePointArc((8.7184506356, 23.963995226), (9.861453998, 22.2834659432), (11.6420996411, 21.3037024767))
            ThreePointArc((11.6420996411, 21.3037024767), (11.9616587874, 22.8008826549), (12.3735283305, 24.2753418823))
        make_face()
    extrude(amount=F1_DEPTH)


with BuildPart() as f1d:
    # F0 (on Front) → F1, piece 4 (new body)
    with BuildSketch(Plane.XZ):
        with Locations((-9.2507740483, -25.3630466759)):
            Rectangle(F0_W, F0_H)
        with Locations((-9.9246706814, -24.7504133731)):
            Circle(F0_R, mode=Mode.SUBTRACT)
    extrude(amount=F1_DEPTH)


with BuildPart() as f1e:
    # F0 (on Front) → F1, piece 5 (new body)
    with BuildSketch(Plane.XZ):
        with Locations((35.165194422, -38.7184694409)):
            Circle(F0_R_2)
    extrude(amount=F1_DEPTH)


solid = Compound([f1.part, f1b.part, f1c.part, f1d.part, f1e.part])
